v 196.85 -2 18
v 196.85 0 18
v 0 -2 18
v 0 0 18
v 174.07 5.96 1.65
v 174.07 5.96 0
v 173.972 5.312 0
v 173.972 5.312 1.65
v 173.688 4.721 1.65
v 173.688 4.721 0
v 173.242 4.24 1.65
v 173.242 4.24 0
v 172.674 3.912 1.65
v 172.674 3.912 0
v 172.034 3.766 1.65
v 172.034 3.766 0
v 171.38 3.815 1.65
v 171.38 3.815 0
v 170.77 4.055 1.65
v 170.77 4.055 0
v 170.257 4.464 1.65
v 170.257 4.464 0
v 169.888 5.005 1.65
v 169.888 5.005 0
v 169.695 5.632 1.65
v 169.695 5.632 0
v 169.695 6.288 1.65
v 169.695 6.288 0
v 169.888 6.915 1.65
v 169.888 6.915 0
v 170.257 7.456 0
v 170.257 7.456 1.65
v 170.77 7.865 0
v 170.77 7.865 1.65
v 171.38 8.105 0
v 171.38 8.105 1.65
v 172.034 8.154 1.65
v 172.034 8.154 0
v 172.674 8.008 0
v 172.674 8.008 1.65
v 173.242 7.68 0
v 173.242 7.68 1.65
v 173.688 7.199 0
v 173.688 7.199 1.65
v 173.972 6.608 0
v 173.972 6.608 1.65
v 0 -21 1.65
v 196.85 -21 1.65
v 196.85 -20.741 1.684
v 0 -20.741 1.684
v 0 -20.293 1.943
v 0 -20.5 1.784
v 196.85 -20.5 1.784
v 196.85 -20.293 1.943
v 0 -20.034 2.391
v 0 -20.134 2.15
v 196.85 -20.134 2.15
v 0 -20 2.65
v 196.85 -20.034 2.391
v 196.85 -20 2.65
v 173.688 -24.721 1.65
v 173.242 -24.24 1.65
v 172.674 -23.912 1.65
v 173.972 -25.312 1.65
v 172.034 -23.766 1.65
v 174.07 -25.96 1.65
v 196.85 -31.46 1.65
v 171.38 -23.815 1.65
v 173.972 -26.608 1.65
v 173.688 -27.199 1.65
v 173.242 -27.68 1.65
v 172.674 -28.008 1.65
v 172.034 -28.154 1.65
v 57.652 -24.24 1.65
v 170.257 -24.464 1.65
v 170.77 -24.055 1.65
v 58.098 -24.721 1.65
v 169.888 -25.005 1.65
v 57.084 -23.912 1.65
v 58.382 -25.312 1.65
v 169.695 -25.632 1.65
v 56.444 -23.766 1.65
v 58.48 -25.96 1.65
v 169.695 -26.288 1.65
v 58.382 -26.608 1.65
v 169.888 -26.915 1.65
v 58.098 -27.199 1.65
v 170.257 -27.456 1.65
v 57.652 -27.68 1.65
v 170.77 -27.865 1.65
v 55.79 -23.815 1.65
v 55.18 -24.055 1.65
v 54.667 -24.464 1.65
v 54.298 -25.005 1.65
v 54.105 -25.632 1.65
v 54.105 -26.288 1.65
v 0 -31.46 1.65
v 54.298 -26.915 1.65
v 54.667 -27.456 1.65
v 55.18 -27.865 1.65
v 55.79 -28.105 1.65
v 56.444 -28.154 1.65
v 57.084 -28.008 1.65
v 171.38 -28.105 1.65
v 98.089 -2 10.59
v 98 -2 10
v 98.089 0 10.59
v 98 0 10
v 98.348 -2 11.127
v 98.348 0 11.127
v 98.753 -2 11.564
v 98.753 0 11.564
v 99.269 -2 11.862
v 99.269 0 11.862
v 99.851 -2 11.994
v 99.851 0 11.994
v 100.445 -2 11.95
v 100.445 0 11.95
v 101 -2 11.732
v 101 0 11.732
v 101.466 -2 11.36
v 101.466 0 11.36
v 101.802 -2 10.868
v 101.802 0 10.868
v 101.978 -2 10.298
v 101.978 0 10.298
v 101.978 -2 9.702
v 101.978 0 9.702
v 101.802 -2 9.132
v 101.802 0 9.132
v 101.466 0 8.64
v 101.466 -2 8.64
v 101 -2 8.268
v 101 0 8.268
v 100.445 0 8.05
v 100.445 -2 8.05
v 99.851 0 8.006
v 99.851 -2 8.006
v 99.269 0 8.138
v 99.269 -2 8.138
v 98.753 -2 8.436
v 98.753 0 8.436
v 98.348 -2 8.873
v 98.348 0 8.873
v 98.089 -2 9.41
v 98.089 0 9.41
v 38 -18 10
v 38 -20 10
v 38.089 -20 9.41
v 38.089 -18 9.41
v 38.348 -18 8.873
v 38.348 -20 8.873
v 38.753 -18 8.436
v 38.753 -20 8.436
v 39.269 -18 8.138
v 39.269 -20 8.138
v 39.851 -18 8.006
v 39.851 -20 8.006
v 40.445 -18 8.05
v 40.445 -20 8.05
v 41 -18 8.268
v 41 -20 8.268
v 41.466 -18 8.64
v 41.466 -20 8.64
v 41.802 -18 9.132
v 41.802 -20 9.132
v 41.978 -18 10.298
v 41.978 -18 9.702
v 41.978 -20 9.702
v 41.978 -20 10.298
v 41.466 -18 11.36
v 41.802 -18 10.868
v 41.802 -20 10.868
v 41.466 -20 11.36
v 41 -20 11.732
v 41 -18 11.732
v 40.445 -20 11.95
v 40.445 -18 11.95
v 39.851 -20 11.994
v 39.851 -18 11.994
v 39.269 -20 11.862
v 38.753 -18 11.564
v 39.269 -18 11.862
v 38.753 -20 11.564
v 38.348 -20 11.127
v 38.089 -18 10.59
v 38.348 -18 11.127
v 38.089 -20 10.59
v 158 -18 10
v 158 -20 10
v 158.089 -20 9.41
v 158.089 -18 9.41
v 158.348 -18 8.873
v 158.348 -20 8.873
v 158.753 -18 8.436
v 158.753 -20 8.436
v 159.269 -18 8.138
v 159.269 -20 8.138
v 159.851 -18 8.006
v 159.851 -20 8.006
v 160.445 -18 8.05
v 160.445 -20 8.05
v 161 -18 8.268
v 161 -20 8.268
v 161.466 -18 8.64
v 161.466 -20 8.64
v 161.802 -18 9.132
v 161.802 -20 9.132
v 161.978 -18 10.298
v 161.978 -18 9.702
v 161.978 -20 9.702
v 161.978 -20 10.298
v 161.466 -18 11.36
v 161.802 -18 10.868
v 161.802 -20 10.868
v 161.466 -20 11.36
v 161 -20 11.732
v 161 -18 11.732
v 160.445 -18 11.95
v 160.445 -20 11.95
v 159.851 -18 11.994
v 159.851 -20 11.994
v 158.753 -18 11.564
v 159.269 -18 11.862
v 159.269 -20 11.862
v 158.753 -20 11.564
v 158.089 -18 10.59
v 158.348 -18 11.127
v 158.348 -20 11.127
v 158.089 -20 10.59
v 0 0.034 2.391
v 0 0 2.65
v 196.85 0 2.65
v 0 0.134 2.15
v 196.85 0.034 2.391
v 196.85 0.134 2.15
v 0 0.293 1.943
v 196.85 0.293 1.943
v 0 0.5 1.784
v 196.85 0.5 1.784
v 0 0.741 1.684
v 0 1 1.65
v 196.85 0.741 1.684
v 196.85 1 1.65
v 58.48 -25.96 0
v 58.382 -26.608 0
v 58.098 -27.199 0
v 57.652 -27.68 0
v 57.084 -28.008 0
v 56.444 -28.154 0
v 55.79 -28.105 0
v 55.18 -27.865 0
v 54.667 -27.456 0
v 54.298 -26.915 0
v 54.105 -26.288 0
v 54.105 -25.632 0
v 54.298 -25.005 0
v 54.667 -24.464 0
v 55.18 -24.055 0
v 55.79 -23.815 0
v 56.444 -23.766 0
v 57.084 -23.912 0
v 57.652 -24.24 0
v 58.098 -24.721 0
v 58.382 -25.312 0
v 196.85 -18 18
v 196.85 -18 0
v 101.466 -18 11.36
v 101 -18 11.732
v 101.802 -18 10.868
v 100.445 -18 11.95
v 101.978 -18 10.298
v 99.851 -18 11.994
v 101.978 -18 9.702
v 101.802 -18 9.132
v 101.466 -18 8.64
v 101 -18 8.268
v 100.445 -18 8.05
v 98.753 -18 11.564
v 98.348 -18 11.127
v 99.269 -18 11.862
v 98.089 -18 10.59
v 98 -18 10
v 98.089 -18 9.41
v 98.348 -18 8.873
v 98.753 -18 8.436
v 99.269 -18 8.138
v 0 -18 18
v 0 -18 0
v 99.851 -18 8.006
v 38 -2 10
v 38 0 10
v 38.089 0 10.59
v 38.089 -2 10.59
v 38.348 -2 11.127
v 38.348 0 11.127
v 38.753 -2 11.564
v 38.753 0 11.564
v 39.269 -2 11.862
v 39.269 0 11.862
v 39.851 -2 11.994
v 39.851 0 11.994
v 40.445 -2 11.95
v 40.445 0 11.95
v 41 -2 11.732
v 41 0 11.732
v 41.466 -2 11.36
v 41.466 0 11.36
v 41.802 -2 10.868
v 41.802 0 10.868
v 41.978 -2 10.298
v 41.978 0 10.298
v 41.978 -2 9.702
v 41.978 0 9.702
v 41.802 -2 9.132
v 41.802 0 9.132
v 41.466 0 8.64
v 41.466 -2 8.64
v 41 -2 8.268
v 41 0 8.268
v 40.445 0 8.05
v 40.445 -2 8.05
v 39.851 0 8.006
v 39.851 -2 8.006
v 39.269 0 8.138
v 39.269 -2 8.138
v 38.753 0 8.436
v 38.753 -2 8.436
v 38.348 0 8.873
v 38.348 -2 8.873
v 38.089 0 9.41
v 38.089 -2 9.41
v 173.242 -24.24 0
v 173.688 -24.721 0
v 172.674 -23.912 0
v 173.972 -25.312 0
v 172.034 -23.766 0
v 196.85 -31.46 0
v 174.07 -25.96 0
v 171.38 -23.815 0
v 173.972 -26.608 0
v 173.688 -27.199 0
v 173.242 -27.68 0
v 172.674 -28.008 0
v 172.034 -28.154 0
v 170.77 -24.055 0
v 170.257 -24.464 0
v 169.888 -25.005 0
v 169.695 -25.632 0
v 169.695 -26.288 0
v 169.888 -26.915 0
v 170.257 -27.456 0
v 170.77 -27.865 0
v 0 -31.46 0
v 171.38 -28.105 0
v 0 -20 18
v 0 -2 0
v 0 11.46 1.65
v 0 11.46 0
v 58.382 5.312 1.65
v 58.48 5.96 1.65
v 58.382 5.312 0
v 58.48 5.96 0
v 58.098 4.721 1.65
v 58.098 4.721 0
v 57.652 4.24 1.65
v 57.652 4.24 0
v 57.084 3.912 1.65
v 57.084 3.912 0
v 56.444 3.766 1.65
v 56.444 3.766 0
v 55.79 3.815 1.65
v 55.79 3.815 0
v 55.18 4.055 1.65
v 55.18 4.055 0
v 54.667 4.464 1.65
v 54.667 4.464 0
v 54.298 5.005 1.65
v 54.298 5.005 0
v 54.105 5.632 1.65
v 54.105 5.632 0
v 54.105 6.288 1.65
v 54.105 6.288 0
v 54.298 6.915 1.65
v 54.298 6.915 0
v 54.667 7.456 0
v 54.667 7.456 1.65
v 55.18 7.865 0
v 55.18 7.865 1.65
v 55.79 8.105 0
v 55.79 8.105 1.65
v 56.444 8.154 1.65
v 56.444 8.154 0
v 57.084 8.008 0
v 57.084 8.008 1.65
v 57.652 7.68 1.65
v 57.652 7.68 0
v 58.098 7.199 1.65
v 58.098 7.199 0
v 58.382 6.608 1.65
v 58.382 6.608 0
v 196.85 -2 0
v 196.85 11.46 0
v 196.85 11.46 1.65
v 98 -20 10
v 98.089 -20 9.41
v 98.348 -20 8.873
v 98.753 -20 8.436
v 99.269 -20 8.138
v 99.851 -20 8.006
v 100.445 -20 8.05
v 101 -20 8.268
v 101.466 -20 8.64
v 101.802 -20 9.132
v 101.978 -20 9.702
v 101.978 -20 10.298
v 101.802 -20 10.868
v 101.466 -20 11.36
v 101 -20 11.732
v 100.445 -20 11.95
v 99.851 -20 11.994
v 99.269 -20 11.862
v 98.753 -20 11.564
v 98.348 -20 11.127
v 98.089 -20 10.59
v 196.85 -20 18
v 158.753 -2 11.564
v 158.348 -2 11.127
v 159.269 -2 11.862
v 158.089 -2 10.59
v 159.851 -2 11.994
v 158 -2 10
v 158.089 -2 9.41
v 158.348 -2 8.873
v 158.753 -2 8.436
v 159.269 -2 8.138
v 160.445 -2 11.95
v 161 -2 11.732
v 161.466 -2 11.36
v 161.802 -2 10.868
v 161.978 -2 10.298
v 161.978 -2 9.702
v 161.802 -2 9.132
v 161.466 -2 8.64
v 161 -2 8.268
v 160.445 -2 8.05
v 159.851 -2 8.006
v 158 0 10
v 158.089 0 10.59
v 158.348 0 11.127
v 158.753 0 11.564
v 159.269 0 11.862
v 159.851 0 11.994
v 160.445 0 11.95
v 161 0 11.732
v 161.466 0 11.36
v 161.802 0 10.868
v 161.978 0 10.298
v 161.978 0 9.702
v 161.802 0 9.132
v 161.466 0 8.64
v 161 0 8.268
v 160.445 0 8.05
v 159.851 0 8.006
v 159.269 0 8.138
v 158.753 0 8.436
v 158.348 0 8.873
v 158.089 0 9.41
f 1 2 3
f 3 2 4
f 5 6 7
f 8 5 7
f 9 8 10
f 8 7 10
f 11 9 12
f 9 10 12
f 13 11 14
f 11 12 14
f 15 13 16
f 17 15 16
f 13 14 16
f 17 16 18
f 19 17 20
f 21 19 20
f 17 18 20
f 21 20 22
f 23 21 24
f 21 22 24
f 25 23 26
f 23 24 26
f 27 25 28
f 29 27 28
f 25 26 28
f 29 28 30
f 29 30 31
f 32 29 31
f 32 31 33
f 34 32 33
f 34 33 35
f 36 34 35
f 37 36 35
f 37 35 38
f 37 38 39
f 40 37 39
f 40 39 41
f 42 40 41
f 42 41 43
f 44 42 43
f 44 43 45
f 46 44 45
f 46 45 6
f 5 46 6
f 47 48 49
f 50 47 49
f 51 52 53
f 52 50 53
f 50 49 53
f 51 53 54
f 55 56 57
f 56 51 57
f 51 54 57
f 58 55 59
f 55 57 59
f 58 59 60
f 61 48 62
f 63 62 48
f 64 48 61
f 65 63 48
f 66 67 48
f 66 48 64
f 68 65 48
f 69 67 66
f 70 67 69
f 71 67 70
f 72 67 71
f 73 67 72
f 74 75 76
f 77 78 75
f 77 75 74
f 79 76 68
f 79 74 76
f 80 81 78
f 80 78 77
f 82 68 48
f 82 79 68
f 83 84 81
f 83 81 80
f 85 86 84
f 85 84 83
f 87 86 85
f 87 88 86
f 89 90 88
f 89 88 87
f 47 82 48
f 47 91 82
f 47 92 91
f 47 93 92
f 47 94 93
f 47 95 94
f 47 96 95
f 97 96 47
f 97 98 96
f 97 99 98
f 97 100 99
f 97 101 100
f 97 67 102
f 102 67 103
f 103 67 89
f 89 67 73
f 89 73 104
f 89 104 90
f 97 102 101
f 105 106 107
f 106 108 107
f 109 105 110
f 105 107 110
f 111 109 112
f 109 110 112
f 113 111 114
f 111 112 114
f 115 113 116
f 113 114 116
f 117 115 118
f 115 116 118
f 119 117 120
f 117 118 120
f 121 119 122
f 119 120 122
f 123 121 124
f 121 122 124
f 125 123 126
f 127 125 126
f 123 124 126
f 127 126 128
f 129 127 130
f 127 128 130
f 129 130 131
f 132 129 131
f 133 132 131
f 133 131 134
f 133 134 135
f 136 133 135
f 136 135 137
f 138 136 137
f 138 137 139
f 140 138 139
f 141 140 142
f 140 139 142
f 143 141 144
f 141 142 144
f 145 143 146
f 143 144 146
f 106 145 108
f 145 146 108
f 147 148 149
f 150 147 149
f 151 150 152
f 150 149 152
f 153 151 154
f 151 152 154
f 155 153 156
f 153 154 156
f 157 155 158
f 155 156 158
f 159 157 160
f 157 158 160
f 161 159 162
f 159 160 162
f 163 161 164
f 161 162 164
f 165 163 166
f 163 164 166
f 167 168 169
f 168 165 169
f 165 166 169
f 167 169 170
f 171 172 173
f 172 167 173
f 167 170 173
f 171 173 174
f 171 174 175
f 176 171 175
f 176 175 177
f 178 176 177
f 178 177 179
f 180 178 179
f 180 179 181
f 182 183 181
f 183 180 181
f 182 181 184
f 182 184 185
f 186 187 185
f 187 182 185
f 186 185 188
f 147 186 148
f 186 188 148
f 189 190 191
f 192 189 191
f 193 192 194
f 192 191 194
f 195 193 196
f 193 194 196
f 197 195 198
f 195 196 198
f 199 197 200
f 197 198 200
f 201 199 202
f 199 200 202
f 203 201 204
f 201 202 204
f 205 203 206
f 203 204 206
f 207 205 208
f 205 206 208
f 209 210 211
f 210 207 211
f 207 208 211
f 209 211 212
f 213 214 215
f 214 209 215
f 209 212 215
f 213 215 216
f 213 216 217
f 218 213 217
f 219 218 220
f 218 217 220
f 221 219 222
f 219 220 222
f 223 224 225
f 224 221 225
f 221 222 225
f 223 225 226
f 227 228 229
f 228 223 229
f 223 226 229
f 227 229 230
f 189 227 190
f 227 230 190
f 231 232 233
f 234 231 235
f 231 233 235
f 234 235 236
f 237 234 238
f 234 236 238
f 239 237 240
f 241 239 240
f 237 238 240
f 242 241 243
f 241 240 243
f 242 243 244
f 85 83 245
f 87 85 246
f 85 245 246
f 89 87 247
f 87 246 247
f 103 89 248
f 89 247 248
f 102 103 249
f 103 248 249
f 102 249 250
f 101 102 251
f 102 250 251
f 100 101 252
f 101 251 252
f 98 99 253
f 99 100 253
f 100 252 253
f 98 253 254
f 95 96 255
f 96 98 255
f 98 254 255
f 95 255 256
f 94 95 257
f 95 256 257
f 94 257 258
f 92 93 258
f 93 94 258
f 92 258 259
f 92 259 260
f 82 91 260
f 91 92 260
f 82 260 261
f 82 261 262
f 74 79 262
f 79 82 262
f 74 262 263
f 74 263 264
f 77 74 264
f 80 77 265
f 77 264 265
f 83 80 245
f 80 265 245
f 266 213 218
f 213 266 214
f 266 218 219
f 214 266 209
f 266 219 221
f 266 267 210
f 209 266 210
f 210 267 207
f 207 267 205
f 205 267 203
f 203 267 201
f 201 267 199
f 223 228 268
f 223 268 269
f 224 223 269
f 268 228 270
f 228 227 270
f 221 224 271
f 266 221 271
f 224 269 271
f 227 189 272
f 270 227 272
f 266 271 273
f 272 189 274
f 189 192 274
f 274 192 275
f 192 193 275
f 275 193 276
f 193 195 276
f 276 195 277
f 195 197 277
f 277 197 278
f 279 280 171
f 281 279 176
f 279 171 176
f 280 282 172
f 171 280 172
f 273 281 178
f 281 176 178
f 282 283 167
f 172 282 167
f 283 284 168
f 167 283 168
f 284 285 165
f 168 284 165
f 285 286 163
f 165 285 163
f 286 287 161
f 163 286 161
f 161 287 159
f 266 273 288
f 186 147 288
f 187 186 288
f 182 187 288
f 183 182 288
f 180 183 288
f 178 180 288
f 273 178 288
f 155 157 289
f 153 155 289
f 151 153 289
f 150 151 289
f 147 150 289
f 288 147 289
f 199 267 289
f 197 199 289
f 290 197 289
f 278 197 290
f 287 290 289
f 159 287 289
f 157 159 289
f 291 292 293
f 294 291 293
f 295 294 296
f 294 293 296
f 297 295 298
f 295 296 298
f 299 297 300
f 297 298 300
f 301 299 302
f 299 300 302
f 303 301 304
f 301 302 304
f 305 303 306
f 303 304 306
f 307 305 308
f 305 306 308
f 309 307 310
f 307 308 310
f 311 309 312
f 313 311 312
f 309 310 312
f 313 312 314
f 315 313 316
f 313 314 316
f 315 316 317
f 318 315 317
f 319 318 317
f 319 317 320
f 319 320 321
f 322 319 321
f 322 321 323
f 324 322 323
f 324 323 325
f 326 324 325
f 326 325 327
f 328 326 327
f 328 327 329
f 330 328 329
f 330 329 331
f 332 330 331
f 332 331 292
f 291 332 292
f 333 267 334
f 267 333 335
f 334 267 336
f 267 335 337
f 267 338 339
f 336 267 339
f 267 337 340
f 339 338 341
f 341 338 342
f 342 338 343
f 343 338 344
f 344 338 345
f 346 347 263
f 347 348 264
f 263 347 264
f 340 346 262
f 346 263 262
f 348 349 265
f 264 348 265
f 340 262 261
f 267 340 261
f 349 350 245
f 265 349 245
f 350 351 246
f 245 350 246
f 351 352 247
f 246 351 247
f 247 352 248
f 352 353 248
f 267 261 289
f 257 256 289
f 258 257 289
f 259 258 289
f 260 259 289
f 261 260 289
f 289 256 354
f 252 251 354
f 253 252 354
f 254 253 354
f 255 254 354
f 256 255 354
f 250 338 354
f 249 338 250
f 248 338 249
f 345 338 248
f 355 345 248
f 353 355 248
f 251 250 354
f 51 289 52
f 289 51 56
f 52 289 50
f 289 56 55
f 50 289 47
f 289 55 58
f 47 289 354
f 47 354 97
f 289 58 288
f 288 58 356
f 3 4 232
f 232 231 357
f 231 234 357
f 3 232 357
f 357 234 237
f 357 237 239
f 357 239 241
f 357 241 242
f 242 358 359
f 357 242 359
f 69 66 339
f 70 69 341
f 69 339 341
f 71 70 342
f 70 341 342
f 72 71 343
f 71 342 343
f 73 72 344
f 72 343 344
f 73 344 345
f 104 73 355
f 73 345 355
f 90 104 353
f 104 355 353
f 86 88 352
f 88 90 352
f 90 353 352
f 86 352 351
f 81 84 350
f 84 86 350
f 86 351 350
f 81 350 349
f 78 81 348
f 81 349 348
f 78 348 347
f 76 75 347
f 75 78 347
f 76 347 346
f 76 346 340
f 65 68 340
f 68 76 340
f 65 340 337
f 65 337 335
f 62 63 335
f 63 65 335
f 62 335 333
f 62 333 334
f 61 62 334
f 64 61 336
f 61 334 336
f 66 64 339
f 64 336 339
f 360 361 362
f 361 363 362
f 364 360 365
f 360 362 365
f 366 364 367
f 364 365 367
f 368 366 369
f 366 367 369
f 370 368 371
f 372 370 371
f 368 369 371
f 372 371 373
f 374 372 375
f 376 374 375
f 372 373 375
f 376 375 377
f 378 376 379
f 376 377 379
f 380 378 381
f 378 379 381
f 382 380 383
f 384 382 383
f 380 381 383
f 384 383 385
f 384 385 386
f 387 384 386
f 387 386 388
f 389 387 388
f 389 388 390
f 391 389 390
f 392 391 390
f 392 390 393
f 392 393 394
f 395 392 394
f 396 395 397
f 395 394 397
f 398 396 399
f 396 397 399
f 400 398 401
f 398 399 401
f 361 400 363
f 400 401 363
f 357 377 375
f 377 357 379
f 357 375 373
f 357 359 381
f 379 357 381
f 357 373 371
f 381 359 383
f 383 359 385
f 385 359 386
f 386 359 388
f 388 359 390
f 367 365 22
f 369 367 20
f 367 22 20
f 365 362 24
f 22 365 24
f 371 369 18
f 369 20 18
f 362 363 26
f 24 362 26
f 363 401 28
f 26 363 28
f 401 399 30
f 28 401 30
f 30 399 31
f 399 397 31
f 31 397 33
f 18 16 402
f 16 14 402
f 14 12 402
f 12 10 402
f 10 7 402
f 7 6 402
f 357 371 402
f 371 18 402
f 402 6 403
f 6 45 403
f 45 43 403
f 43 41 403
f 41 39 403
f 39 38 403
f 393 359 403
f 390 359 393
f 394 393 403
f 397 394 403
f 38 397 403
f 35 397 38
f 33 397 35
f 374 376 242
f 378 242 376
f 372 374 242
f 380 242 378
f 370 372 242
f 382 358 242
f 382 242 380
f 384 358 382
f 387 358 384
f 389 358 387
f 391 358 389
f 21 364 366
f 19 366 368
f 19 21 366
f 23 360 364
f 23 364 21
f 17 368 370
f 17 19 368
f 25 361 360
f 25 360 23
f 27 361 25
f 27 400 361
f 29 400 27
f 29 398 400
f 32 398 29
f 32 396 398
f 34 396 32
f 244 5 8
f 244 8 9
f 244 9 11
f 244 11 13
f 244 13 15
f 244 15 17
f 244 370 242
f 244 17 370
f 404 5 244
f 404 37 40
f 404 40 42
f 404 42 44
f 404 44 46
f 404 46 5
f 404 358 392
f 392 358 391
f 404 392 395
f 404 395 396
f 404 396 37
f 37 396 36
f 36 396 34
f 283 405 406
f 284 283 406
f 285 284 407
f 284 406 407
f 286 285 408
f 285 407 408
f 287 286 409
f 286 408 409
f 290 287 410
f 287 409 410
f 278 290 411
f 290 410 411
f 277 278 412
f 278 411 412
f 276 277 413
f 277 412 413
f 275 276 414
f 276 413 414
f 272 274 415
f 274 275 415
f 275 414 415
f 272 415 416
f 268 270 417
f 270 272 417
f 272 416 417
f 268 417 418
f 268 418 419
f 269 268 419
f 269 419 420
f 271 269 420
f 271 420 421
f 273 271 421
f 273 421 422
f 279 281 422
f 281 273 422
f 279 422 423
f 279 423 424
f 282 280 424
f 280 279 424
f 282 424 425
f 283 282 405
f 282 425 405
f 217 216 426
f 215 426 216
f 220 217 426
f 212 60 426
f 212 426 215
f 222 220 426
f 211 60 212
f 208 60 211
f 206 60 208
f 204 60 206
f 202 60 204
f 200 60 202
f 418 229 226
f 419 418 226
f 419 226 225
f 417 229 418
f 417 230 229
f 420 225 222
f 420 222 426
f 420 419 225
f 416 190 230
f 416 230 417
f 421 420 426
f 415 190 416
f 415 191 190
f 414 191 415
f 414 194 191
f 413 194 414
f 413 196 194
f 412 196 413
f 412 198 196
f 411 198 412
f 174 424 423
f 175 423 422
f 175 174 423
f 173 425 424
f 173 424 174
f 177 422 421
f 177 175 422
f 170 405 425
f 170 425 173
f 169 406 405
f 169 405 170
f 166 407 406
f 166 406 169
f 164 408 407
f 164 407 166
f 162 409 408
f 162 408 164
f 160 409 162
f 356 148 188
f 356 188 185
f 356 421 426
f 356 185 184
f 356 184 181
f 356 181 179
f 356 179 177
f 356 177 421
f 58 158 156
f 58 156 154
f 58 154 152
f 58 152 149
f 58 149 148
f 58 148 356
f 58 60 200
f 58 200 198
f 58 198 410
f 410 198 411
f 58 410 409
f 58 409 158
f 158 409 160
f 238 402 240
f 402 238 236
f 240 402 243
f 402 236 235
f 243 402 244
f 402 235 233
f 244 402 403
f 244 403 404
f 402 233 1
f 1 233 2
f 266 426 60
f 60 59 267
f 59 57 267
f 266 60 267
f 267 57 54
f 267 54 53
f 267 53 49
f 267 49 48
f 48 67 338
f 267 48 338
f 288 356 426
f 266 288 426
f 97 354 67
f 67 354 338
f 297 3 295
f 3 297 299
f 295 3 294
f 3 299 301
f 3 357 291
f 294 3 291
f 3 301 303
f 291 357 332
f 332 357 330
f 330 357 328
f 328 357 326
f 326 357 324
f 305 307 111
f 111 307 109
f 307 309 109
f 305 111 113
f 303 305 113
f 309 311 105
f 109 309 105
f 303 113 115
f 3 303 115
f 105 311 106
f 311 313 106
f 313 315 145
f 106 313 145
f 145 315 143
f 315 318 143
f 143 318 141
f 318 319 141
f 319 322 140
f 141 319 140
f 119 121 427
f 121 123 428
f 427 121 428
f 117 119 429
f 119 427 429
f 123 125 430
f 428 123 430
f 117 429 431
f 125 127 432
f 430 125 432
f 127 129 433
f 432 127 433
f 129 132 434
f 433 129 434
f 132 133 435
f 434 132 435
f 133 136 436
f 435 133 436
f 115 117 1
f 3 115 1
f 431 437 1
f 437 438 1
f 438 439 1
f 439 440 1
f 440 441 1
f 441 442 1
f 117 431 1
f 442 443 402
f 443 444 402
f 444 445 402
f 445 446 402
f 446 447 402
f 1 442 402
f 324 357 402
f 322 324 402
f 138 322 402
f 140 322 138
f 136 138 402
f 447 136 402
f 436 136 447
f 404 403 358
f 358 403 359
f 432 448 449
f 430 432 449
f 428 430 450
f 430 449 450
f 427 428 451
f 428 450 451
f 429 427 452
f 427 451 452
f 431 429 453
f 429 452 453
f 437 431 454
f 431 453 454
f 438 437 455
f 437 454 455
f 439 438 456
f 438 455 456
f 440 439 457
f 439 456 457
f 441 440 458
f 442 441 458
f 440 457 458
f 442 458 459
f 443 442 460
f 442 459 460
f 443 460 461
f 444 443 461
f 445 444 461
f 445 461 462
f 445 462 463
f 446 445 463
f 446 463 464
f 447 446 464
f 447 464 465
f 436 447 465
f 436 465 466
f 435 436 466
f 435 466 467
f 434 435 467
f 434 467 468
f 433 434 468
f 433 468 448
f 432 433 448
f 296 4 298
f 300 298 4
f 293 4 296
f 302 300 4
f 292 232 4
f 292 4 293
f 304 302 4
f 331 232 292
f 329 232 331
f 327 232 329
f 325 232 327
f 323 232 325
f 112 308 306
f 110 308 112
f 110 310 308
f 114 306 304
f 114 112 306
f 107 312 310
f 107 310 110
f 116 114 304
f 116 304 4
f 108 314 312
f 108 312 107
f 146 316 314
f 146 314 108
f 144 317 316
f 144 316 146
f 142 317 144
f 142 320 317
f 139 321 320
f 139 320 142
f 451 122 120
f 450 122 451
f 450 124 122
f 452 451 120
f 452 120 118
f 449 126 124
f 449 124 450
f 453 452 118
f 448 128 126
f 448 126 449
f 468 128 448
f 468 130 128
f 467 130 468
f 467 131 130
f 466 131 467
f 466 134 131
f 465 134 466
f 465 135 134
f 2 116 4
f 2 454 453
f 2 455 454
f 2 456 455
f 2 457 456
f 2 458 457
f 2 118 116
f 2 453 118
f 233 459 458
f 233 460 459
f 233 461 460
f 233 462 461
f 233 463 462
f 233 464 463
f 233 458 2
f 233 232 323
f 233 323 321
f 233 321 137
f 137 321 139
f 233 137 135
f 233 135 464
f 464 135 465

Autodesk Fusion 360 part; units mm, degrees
sketch "Sketch1" plane through (0, 0, 0) normal (0, 0, 1) x (1, 0, 0)
  line L0 (0, 0) -> (196.85, 0)
  line L1 (196.85, 0) -> (196.85, 11.46)
  line L2 (196.85, 11.46) -> (0, 11.46)
  line L3 (0, 11.46) -> (0, 0)
  circle A0 centre (56.28, 5.96) radius 2.2
  circle A1 centre (171.87, 5.96) radius 2.2
  dimension "d1" = 196.85
  dimension "d2" = 11.46
  dimension "d5" = 4.4
  dimension "d6" = 56.28
  dimension "d7" = 4.4
  dimension "d8" = 24.98
  dimension "d9" = 5.5
  dimension "d10" = 5.5
extrude "Extrude1" add sketch "Sketch1" along normal blind 1.65 contours L0 L1 L2 L3 | A0 | A1 makes body 1
extrude "Extrude2" cut sketch "Sketch1" along normal through all contours A0 | A1 bodies 1
sketch "Sketch2" plane through (0, 0, 0) normal (0, 1, 0) x (1, 0, 0)
  line L0 (0, 0) -> (196.85, 0)
  line L1 (196.85, 0) -> (196.85, -18)
  line L2 (196.85, -18) -> (0, -18)
  line L3 (0, -18) -> (0, 0)
  dimension "d12" = 196.85
  dimension "d13" = 18
extrude "Extrude3" add sketch "Sketch2" against normal blind 2 bodies 1
fillet "Fillet1" radius 1 1 edges at (98.425, 0, 1.65) on bodies 1
sketch "Sketch3" plane through (0, 0, 0) normal (0, 1, 0) x (-1, 0, 0)
  line L0 (-196.85, 2.65) -> (0, 2.65)
  line L1 (0, 2.65) -> (0, 18)
  line L2 (0, 18) -> (-196.85, 18)
  line L3 (-196.85, 18) -> (-196.85, 2.65)
  circle A0 centre (-160, 10) radius 2
  circle A1 centre (-100, 10) radius 2
  circle A2 centre (-40, 10) radius 2
  dimension "d18" = 4
  dimension "d19" = 4
  dimension "d20" = 4
extrude "Extrude4" cut sketch "Sketch3" against normal blind 5 contours A0 | A1 | A2 bodies 1
ref_plane "WorkPlane1" through (0, -10, 0) normal (0, 1, 0) x (0, 0, 1)
mirror "Mirror1" about plane through (0, -10, 0) normal (0, 1, 0) of bodies 1 makes body 2
